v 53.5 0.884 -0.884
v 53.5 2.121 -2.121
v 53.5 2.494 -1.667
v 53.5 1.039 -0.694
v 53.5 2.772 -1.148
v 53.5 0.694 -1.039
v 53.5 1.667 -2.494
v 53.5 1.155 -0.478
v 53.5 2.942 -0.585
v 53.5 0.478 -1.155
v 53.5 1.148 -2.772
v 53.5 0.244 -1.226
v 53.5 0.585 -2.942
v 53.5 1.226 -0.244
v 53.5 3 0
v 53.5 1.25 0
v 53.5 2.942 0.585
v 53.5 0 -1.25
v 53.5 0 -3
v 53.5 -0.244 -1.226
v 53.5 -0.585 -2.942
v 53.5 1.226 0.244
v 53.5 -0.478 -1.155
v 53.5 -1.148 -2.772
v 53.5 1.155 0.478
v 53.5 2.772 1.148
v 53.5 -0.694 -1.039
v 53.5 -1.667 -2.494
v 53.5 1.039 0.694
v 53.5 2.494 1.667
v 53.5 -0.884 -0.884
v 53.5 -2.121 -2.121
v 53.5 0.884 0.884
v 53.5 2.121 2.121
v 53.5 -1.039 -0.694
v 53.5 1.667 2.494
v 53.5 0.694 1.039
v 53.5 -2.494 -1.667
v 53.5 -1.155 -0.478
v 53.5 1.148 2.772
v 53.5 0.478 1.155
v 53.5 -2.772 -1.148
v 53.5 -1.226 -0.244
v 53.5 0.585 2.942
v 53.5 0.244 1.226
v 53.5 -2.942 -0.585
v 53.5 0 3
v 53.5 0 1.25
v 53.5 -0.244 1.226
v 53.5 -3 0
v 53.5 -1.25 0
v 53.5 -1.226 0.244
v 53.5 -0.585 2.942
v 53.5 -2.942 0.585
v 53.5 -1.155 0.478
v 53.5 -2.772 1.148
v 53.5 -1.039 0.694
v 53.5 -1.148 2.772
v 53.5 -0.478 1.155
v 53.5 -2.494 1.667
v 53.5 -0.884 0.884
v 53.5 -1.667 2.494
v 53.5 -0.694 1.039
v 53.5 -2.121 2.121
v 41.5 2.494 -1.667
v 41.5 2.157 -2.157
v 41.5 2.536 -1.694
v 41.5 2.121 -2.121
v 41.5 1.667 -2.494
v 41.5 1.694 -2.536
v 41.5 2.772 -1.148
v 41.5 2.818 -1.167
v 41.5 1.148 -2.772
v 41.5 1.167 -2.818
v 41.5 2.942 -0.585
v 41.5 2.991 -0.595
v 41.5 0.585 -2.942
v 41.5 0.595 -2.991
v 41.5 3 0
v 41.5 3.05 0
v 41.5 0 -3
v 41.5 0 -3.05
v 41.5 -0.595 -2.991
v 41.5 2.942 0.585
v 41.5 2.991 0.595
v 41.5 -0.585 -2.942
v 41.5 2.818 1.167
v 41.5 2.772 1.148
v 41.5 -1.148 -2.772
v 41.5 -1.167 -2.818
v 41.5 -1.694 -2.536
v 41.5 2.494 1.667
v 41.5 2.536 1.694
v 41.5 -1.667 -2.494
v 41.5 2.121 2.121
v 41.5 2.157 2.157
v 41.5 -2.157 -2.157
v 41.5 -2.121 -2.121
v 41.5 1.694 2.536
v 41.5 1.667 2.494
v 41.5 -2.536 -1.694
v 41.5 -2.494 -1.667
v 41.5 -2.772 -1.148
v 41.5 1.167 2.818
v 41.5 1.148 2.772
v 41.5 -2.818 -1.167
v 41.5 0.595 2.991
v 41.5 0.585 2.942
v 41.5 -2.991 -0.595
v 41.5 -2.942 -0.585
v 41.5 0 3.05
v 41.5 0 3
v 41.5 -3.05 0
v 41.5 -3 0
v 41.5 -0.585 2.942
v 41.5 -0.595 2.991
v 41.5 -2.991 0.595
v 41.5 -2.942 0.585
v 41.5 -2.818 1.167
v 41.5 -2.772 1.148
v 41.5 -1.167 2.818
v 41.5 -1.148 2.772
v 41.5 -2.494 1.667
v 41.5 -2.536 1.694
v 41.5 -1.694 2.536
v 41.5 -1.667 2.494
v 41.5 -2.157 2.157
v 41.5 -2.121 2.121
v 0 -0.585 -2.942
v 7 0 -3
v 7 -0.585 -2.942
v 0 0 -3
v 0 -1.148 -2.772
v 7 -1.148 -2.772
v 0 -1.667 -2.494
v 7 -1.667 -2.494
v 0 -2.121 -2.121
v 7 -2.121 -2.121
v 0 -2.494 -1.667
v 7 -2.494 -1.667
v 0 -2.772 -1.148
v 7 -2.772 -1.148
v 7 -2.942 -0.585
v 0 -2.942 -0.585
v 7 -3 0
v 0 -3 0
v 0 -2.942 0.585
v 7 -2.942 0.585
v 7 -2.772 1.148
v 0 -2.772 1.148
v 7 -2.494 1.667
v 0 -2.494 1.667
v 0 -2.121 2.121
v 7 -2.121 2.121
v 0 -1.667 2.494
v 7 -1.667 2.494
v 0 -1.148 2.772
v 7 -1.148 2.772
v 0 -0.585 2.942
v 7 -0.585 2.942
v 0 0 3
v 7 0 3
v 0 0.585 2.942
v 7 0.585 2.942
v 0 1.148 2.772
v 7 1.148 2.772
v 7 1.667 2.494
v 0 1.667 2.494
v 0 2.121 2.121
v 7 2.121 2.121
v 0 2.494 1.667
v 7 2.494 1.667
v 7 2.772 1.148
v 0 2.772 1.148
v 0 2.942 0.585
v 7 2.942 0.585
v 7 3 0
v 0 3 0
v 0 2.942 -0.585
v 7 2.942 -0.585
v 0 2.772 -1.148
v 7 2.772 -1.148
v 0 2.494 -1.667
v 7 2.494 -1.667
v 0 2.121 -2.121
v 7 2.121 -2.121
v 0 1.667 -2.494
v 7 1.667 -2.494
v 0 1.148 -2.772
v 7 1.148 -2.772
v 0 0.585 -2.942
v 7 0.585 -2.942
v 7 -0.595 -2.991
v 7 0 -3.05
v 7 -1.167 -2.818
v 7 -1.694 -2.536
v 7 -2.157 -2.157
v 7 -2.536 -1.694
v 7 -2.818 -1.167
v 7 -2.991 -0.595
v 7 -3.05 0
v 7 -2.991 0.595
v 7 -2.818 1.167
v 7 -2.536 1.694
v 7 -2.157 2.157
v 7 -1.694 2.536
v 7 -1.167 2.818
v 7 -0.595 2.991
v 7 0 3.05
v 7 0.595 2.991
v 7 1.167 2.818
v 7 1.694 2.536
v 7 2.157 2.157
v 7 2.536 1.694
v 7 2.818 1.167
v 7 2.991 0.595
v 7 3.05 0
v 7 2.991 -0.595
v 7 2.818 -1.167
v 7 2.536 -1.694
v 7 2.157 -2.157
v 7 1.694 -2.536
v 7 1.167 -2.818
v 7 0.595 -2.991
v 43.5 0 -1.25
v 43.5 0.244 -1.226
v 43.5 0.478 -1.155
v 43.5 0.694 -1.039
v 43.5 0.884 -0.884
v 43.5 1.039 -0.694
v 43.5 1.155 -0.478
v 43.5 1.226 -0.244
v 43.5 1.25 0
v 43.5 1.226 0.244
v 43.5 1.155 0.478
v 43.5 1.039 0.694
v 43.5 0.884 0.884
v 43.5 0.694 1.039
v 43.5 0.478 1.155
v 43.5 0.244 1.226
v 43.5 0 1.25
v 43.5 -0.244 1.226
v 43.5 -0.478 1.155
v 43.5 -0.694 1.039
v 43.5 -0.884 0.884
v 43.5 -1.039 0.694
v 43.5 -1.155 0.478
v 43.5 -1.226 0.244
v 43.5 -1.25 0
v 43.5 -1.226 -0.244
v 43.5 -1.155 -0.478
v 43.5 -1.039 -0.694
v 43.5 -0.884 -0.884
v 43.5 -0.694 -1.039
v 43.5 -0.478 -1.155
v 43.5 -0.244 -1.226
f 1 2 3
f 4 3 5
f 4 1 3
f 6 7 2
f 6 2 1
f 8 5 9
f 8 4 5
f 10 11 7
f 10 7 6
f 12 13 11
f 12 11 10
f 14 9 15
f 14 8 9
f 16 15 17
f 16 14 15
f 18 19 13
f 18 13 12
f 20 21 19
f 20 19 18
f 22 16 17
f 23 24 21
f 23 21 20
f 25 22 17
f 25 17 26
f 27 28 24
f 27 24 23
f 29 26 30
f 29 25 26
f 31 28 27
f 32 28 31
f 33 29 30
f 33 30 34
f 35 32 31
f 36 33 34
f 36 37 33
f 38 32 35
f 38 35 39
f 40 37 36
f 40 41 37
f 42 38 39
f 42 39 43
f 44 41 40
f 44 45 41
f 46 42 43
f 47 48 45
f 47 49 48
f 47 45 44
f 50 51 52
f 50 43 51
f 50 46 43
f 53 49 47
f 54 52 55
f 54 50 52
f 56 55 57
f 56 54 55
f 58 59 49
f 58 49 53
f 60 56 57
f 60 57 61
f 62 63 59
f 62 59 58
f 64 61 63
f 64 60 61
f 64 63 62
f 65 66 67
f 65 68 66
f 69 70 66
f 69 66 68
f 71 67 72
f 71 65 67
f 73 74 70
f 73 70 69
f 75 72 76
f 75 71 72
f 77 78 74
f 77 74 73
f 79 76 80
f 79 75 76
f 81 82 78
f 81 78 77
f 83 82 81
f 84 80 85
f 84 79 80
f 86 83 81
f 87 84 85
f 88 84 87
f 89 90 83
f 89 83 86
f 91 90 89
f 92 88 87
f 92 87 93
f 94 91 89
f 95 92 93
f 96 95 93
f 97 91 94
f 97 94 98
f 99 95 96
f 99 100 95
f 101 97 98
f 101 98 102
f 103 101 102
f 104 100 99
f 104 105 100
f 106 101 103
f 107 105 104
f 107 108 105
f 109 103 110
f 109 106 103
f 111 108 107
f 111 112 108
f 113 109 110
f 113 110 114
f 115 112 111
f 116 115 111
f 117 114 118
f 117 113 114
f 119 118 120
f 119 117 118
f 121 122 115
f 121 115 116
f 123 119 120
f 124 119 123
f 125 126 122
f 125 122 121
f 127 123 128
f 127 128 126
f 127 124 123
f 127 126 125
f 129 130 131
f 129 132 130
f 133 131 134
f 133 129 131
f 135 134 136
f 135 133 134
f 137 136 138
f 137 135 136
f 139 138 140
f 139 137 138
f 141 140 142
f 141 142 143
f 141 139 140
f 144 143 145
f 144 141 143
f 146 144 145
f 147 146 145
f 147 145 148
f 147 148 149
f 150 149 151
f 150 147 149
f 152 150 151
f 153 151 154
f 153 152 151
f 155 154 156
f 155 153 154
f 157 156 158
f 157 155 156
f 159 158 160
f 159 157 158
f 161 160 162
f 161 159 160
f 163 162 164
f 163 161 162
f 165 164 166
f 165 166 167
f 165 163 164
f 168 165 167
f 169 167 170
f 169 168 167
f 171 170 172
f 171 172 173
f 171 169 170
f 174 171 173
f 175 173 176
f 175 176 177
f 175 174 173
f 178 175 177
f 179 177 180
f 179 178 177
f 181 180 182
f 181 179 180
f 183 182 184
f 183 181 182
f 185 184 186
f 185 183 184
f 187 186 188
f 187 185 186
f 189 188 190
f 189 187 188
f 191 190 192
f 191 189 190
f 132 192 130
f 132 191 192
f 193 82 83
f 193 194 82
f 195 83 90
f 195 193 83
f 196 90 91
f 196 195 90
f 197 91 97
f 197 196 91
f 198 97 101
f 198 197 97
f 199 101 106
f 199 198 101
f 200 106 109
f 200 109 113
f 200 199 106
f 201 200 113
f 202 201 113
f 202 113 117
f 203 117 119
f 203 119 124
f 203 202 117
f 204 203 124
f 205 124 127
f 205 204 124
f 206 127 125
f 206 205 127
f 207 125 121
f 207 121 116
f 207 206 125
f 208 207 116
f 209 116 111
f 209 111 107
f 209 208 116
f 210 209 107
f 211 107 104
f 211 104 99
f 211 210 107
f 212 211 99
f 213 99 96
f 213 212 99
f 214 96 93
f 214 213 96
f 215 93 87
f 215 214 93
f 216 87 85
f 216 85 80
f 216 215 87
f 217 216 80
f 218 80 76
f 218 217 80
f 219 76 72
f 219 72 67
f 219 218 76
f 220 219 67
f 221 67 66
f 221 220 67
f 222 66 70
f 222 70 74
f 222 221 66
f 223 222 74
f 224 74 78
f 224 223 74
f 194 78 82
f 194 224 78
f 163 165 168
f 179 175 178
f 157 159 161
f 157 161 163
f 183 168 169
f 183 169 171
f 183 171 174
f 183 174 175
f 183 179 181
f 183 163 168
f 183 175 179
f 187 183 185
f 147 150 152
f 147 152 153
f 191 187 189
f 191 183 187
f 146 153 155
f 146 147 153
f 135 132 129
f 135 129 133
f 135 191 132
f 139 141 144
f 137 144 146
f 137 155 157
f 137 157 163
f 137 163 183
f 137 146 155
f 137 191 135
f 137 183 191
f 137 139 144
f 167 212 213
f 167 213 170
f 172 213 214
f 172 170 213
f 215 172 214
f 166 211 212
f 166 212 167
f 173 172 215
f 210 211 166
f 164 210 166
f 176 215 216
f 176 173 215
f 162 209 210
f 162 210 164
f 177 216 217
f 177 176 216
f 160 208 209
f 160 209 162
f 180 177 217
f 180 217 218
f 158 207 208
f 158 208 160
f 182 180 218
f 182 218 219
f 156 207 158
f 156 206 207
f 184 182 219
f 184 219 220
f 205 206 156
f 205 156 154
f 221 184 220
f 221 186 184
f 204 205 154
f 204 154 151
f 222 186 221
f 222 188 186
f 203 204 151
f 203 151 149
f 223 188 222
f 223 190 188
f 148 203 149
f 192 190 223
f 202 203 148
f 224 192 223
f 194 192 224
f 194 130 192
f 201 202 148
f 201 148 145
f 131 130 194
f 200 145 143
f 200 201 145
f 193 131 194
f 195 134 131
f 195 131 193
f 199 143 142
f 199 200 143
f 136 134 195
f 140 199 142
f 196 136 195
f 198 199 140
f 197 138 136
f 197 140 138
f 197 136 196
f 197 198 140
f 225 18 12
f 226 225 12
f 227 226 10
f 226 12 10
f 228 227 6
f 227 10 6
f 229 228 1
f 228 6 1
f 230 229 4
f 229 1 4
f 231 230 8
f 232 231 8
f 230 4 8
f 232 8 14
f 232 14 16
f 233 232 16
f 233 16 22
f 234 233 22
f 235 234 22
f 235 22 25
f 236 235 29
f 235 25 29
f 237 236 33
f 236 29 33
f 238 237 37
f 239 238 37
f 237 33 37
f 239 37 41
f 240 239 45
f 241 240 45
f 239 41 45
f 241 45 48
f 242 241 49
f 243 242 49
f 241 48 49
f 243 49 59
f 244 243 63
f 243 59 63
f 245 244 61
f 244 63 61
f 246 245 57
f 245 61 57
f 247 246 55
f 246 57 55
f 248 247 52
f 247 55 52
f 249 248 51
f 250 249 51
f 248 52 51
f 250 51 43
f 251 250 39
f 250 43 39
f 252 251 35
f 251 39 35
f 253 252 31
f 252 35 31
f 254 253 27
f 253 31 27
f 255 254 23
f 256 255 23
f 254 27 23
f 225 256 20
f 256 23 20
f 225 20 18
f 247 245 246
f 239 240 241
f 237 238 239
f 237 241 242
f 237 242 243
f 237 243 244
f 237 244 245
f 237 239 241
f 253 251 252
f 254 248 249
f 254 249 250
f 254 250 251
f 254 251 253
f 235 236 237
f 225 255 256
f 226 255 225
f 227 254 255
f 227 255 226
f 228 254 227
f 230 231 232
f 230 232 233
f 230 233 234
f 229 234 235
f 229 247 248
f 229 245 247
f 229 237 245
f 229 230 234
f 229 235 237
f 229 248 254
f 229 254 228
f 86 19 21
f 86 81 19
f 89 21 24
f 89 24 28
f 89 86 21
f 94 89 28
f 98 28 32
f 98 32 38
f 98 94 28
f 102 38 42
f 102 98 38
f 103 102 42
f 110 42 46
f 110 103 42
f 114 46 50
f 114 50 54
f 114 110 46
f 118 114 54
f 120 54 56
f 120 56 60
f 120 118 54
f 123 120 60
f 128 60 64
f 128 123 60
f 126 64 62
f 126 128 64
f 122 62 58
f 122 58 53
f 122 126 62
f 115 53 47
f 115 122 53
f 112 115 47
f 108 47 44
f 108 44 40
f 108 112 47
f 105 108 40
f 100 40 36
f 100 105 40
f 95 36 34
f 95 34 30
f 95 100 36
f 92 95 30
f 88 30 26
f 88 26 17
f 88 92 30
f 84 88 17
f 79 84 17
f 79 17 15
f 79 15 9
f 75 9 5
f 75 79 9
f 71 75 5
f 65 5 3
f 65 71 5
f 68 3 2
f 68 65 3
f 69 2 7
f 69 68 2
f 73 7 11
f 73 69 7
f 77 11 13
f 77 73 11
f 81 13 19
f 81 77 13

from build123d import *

# Parameters (mm, degrees)
ESBO_O1_R             = 1.25
CORTE_EXTRUS_O1_DEPTH = 10


with BuildPart() as part:
    # Sketch1 → Revolve1 (revolve)
    with BuildSketch(Plane(origin=(0, 0, 0), x_dir=(1, 0, 0), z_dir=(0, 1, 0))):
        Polygon((0, 0), (7, 0), (41.5, 0), (53.5, 0), (53.5, 3), (41.5, 3), (41.5, 3.05), (7, 3.05), (7, 3), (0, 3), align=None)
    revolve(axis=Axis((0, 0, 0), (-1, 0, 0)))

    # Esboço1 → Corte-extrusão1 (cut)
    with BuildSketch(Plane(origin=(53.5, 0, 0), x_dir=(0, 0, -1), z_dir=(1, 0, 0))):
        Circle(ESBO_O1_R)
    extrude(amount=-CORTE_EXTRUS_O1_DEPTH, mode=Mode.SUBTRACT)


solid = part.part
